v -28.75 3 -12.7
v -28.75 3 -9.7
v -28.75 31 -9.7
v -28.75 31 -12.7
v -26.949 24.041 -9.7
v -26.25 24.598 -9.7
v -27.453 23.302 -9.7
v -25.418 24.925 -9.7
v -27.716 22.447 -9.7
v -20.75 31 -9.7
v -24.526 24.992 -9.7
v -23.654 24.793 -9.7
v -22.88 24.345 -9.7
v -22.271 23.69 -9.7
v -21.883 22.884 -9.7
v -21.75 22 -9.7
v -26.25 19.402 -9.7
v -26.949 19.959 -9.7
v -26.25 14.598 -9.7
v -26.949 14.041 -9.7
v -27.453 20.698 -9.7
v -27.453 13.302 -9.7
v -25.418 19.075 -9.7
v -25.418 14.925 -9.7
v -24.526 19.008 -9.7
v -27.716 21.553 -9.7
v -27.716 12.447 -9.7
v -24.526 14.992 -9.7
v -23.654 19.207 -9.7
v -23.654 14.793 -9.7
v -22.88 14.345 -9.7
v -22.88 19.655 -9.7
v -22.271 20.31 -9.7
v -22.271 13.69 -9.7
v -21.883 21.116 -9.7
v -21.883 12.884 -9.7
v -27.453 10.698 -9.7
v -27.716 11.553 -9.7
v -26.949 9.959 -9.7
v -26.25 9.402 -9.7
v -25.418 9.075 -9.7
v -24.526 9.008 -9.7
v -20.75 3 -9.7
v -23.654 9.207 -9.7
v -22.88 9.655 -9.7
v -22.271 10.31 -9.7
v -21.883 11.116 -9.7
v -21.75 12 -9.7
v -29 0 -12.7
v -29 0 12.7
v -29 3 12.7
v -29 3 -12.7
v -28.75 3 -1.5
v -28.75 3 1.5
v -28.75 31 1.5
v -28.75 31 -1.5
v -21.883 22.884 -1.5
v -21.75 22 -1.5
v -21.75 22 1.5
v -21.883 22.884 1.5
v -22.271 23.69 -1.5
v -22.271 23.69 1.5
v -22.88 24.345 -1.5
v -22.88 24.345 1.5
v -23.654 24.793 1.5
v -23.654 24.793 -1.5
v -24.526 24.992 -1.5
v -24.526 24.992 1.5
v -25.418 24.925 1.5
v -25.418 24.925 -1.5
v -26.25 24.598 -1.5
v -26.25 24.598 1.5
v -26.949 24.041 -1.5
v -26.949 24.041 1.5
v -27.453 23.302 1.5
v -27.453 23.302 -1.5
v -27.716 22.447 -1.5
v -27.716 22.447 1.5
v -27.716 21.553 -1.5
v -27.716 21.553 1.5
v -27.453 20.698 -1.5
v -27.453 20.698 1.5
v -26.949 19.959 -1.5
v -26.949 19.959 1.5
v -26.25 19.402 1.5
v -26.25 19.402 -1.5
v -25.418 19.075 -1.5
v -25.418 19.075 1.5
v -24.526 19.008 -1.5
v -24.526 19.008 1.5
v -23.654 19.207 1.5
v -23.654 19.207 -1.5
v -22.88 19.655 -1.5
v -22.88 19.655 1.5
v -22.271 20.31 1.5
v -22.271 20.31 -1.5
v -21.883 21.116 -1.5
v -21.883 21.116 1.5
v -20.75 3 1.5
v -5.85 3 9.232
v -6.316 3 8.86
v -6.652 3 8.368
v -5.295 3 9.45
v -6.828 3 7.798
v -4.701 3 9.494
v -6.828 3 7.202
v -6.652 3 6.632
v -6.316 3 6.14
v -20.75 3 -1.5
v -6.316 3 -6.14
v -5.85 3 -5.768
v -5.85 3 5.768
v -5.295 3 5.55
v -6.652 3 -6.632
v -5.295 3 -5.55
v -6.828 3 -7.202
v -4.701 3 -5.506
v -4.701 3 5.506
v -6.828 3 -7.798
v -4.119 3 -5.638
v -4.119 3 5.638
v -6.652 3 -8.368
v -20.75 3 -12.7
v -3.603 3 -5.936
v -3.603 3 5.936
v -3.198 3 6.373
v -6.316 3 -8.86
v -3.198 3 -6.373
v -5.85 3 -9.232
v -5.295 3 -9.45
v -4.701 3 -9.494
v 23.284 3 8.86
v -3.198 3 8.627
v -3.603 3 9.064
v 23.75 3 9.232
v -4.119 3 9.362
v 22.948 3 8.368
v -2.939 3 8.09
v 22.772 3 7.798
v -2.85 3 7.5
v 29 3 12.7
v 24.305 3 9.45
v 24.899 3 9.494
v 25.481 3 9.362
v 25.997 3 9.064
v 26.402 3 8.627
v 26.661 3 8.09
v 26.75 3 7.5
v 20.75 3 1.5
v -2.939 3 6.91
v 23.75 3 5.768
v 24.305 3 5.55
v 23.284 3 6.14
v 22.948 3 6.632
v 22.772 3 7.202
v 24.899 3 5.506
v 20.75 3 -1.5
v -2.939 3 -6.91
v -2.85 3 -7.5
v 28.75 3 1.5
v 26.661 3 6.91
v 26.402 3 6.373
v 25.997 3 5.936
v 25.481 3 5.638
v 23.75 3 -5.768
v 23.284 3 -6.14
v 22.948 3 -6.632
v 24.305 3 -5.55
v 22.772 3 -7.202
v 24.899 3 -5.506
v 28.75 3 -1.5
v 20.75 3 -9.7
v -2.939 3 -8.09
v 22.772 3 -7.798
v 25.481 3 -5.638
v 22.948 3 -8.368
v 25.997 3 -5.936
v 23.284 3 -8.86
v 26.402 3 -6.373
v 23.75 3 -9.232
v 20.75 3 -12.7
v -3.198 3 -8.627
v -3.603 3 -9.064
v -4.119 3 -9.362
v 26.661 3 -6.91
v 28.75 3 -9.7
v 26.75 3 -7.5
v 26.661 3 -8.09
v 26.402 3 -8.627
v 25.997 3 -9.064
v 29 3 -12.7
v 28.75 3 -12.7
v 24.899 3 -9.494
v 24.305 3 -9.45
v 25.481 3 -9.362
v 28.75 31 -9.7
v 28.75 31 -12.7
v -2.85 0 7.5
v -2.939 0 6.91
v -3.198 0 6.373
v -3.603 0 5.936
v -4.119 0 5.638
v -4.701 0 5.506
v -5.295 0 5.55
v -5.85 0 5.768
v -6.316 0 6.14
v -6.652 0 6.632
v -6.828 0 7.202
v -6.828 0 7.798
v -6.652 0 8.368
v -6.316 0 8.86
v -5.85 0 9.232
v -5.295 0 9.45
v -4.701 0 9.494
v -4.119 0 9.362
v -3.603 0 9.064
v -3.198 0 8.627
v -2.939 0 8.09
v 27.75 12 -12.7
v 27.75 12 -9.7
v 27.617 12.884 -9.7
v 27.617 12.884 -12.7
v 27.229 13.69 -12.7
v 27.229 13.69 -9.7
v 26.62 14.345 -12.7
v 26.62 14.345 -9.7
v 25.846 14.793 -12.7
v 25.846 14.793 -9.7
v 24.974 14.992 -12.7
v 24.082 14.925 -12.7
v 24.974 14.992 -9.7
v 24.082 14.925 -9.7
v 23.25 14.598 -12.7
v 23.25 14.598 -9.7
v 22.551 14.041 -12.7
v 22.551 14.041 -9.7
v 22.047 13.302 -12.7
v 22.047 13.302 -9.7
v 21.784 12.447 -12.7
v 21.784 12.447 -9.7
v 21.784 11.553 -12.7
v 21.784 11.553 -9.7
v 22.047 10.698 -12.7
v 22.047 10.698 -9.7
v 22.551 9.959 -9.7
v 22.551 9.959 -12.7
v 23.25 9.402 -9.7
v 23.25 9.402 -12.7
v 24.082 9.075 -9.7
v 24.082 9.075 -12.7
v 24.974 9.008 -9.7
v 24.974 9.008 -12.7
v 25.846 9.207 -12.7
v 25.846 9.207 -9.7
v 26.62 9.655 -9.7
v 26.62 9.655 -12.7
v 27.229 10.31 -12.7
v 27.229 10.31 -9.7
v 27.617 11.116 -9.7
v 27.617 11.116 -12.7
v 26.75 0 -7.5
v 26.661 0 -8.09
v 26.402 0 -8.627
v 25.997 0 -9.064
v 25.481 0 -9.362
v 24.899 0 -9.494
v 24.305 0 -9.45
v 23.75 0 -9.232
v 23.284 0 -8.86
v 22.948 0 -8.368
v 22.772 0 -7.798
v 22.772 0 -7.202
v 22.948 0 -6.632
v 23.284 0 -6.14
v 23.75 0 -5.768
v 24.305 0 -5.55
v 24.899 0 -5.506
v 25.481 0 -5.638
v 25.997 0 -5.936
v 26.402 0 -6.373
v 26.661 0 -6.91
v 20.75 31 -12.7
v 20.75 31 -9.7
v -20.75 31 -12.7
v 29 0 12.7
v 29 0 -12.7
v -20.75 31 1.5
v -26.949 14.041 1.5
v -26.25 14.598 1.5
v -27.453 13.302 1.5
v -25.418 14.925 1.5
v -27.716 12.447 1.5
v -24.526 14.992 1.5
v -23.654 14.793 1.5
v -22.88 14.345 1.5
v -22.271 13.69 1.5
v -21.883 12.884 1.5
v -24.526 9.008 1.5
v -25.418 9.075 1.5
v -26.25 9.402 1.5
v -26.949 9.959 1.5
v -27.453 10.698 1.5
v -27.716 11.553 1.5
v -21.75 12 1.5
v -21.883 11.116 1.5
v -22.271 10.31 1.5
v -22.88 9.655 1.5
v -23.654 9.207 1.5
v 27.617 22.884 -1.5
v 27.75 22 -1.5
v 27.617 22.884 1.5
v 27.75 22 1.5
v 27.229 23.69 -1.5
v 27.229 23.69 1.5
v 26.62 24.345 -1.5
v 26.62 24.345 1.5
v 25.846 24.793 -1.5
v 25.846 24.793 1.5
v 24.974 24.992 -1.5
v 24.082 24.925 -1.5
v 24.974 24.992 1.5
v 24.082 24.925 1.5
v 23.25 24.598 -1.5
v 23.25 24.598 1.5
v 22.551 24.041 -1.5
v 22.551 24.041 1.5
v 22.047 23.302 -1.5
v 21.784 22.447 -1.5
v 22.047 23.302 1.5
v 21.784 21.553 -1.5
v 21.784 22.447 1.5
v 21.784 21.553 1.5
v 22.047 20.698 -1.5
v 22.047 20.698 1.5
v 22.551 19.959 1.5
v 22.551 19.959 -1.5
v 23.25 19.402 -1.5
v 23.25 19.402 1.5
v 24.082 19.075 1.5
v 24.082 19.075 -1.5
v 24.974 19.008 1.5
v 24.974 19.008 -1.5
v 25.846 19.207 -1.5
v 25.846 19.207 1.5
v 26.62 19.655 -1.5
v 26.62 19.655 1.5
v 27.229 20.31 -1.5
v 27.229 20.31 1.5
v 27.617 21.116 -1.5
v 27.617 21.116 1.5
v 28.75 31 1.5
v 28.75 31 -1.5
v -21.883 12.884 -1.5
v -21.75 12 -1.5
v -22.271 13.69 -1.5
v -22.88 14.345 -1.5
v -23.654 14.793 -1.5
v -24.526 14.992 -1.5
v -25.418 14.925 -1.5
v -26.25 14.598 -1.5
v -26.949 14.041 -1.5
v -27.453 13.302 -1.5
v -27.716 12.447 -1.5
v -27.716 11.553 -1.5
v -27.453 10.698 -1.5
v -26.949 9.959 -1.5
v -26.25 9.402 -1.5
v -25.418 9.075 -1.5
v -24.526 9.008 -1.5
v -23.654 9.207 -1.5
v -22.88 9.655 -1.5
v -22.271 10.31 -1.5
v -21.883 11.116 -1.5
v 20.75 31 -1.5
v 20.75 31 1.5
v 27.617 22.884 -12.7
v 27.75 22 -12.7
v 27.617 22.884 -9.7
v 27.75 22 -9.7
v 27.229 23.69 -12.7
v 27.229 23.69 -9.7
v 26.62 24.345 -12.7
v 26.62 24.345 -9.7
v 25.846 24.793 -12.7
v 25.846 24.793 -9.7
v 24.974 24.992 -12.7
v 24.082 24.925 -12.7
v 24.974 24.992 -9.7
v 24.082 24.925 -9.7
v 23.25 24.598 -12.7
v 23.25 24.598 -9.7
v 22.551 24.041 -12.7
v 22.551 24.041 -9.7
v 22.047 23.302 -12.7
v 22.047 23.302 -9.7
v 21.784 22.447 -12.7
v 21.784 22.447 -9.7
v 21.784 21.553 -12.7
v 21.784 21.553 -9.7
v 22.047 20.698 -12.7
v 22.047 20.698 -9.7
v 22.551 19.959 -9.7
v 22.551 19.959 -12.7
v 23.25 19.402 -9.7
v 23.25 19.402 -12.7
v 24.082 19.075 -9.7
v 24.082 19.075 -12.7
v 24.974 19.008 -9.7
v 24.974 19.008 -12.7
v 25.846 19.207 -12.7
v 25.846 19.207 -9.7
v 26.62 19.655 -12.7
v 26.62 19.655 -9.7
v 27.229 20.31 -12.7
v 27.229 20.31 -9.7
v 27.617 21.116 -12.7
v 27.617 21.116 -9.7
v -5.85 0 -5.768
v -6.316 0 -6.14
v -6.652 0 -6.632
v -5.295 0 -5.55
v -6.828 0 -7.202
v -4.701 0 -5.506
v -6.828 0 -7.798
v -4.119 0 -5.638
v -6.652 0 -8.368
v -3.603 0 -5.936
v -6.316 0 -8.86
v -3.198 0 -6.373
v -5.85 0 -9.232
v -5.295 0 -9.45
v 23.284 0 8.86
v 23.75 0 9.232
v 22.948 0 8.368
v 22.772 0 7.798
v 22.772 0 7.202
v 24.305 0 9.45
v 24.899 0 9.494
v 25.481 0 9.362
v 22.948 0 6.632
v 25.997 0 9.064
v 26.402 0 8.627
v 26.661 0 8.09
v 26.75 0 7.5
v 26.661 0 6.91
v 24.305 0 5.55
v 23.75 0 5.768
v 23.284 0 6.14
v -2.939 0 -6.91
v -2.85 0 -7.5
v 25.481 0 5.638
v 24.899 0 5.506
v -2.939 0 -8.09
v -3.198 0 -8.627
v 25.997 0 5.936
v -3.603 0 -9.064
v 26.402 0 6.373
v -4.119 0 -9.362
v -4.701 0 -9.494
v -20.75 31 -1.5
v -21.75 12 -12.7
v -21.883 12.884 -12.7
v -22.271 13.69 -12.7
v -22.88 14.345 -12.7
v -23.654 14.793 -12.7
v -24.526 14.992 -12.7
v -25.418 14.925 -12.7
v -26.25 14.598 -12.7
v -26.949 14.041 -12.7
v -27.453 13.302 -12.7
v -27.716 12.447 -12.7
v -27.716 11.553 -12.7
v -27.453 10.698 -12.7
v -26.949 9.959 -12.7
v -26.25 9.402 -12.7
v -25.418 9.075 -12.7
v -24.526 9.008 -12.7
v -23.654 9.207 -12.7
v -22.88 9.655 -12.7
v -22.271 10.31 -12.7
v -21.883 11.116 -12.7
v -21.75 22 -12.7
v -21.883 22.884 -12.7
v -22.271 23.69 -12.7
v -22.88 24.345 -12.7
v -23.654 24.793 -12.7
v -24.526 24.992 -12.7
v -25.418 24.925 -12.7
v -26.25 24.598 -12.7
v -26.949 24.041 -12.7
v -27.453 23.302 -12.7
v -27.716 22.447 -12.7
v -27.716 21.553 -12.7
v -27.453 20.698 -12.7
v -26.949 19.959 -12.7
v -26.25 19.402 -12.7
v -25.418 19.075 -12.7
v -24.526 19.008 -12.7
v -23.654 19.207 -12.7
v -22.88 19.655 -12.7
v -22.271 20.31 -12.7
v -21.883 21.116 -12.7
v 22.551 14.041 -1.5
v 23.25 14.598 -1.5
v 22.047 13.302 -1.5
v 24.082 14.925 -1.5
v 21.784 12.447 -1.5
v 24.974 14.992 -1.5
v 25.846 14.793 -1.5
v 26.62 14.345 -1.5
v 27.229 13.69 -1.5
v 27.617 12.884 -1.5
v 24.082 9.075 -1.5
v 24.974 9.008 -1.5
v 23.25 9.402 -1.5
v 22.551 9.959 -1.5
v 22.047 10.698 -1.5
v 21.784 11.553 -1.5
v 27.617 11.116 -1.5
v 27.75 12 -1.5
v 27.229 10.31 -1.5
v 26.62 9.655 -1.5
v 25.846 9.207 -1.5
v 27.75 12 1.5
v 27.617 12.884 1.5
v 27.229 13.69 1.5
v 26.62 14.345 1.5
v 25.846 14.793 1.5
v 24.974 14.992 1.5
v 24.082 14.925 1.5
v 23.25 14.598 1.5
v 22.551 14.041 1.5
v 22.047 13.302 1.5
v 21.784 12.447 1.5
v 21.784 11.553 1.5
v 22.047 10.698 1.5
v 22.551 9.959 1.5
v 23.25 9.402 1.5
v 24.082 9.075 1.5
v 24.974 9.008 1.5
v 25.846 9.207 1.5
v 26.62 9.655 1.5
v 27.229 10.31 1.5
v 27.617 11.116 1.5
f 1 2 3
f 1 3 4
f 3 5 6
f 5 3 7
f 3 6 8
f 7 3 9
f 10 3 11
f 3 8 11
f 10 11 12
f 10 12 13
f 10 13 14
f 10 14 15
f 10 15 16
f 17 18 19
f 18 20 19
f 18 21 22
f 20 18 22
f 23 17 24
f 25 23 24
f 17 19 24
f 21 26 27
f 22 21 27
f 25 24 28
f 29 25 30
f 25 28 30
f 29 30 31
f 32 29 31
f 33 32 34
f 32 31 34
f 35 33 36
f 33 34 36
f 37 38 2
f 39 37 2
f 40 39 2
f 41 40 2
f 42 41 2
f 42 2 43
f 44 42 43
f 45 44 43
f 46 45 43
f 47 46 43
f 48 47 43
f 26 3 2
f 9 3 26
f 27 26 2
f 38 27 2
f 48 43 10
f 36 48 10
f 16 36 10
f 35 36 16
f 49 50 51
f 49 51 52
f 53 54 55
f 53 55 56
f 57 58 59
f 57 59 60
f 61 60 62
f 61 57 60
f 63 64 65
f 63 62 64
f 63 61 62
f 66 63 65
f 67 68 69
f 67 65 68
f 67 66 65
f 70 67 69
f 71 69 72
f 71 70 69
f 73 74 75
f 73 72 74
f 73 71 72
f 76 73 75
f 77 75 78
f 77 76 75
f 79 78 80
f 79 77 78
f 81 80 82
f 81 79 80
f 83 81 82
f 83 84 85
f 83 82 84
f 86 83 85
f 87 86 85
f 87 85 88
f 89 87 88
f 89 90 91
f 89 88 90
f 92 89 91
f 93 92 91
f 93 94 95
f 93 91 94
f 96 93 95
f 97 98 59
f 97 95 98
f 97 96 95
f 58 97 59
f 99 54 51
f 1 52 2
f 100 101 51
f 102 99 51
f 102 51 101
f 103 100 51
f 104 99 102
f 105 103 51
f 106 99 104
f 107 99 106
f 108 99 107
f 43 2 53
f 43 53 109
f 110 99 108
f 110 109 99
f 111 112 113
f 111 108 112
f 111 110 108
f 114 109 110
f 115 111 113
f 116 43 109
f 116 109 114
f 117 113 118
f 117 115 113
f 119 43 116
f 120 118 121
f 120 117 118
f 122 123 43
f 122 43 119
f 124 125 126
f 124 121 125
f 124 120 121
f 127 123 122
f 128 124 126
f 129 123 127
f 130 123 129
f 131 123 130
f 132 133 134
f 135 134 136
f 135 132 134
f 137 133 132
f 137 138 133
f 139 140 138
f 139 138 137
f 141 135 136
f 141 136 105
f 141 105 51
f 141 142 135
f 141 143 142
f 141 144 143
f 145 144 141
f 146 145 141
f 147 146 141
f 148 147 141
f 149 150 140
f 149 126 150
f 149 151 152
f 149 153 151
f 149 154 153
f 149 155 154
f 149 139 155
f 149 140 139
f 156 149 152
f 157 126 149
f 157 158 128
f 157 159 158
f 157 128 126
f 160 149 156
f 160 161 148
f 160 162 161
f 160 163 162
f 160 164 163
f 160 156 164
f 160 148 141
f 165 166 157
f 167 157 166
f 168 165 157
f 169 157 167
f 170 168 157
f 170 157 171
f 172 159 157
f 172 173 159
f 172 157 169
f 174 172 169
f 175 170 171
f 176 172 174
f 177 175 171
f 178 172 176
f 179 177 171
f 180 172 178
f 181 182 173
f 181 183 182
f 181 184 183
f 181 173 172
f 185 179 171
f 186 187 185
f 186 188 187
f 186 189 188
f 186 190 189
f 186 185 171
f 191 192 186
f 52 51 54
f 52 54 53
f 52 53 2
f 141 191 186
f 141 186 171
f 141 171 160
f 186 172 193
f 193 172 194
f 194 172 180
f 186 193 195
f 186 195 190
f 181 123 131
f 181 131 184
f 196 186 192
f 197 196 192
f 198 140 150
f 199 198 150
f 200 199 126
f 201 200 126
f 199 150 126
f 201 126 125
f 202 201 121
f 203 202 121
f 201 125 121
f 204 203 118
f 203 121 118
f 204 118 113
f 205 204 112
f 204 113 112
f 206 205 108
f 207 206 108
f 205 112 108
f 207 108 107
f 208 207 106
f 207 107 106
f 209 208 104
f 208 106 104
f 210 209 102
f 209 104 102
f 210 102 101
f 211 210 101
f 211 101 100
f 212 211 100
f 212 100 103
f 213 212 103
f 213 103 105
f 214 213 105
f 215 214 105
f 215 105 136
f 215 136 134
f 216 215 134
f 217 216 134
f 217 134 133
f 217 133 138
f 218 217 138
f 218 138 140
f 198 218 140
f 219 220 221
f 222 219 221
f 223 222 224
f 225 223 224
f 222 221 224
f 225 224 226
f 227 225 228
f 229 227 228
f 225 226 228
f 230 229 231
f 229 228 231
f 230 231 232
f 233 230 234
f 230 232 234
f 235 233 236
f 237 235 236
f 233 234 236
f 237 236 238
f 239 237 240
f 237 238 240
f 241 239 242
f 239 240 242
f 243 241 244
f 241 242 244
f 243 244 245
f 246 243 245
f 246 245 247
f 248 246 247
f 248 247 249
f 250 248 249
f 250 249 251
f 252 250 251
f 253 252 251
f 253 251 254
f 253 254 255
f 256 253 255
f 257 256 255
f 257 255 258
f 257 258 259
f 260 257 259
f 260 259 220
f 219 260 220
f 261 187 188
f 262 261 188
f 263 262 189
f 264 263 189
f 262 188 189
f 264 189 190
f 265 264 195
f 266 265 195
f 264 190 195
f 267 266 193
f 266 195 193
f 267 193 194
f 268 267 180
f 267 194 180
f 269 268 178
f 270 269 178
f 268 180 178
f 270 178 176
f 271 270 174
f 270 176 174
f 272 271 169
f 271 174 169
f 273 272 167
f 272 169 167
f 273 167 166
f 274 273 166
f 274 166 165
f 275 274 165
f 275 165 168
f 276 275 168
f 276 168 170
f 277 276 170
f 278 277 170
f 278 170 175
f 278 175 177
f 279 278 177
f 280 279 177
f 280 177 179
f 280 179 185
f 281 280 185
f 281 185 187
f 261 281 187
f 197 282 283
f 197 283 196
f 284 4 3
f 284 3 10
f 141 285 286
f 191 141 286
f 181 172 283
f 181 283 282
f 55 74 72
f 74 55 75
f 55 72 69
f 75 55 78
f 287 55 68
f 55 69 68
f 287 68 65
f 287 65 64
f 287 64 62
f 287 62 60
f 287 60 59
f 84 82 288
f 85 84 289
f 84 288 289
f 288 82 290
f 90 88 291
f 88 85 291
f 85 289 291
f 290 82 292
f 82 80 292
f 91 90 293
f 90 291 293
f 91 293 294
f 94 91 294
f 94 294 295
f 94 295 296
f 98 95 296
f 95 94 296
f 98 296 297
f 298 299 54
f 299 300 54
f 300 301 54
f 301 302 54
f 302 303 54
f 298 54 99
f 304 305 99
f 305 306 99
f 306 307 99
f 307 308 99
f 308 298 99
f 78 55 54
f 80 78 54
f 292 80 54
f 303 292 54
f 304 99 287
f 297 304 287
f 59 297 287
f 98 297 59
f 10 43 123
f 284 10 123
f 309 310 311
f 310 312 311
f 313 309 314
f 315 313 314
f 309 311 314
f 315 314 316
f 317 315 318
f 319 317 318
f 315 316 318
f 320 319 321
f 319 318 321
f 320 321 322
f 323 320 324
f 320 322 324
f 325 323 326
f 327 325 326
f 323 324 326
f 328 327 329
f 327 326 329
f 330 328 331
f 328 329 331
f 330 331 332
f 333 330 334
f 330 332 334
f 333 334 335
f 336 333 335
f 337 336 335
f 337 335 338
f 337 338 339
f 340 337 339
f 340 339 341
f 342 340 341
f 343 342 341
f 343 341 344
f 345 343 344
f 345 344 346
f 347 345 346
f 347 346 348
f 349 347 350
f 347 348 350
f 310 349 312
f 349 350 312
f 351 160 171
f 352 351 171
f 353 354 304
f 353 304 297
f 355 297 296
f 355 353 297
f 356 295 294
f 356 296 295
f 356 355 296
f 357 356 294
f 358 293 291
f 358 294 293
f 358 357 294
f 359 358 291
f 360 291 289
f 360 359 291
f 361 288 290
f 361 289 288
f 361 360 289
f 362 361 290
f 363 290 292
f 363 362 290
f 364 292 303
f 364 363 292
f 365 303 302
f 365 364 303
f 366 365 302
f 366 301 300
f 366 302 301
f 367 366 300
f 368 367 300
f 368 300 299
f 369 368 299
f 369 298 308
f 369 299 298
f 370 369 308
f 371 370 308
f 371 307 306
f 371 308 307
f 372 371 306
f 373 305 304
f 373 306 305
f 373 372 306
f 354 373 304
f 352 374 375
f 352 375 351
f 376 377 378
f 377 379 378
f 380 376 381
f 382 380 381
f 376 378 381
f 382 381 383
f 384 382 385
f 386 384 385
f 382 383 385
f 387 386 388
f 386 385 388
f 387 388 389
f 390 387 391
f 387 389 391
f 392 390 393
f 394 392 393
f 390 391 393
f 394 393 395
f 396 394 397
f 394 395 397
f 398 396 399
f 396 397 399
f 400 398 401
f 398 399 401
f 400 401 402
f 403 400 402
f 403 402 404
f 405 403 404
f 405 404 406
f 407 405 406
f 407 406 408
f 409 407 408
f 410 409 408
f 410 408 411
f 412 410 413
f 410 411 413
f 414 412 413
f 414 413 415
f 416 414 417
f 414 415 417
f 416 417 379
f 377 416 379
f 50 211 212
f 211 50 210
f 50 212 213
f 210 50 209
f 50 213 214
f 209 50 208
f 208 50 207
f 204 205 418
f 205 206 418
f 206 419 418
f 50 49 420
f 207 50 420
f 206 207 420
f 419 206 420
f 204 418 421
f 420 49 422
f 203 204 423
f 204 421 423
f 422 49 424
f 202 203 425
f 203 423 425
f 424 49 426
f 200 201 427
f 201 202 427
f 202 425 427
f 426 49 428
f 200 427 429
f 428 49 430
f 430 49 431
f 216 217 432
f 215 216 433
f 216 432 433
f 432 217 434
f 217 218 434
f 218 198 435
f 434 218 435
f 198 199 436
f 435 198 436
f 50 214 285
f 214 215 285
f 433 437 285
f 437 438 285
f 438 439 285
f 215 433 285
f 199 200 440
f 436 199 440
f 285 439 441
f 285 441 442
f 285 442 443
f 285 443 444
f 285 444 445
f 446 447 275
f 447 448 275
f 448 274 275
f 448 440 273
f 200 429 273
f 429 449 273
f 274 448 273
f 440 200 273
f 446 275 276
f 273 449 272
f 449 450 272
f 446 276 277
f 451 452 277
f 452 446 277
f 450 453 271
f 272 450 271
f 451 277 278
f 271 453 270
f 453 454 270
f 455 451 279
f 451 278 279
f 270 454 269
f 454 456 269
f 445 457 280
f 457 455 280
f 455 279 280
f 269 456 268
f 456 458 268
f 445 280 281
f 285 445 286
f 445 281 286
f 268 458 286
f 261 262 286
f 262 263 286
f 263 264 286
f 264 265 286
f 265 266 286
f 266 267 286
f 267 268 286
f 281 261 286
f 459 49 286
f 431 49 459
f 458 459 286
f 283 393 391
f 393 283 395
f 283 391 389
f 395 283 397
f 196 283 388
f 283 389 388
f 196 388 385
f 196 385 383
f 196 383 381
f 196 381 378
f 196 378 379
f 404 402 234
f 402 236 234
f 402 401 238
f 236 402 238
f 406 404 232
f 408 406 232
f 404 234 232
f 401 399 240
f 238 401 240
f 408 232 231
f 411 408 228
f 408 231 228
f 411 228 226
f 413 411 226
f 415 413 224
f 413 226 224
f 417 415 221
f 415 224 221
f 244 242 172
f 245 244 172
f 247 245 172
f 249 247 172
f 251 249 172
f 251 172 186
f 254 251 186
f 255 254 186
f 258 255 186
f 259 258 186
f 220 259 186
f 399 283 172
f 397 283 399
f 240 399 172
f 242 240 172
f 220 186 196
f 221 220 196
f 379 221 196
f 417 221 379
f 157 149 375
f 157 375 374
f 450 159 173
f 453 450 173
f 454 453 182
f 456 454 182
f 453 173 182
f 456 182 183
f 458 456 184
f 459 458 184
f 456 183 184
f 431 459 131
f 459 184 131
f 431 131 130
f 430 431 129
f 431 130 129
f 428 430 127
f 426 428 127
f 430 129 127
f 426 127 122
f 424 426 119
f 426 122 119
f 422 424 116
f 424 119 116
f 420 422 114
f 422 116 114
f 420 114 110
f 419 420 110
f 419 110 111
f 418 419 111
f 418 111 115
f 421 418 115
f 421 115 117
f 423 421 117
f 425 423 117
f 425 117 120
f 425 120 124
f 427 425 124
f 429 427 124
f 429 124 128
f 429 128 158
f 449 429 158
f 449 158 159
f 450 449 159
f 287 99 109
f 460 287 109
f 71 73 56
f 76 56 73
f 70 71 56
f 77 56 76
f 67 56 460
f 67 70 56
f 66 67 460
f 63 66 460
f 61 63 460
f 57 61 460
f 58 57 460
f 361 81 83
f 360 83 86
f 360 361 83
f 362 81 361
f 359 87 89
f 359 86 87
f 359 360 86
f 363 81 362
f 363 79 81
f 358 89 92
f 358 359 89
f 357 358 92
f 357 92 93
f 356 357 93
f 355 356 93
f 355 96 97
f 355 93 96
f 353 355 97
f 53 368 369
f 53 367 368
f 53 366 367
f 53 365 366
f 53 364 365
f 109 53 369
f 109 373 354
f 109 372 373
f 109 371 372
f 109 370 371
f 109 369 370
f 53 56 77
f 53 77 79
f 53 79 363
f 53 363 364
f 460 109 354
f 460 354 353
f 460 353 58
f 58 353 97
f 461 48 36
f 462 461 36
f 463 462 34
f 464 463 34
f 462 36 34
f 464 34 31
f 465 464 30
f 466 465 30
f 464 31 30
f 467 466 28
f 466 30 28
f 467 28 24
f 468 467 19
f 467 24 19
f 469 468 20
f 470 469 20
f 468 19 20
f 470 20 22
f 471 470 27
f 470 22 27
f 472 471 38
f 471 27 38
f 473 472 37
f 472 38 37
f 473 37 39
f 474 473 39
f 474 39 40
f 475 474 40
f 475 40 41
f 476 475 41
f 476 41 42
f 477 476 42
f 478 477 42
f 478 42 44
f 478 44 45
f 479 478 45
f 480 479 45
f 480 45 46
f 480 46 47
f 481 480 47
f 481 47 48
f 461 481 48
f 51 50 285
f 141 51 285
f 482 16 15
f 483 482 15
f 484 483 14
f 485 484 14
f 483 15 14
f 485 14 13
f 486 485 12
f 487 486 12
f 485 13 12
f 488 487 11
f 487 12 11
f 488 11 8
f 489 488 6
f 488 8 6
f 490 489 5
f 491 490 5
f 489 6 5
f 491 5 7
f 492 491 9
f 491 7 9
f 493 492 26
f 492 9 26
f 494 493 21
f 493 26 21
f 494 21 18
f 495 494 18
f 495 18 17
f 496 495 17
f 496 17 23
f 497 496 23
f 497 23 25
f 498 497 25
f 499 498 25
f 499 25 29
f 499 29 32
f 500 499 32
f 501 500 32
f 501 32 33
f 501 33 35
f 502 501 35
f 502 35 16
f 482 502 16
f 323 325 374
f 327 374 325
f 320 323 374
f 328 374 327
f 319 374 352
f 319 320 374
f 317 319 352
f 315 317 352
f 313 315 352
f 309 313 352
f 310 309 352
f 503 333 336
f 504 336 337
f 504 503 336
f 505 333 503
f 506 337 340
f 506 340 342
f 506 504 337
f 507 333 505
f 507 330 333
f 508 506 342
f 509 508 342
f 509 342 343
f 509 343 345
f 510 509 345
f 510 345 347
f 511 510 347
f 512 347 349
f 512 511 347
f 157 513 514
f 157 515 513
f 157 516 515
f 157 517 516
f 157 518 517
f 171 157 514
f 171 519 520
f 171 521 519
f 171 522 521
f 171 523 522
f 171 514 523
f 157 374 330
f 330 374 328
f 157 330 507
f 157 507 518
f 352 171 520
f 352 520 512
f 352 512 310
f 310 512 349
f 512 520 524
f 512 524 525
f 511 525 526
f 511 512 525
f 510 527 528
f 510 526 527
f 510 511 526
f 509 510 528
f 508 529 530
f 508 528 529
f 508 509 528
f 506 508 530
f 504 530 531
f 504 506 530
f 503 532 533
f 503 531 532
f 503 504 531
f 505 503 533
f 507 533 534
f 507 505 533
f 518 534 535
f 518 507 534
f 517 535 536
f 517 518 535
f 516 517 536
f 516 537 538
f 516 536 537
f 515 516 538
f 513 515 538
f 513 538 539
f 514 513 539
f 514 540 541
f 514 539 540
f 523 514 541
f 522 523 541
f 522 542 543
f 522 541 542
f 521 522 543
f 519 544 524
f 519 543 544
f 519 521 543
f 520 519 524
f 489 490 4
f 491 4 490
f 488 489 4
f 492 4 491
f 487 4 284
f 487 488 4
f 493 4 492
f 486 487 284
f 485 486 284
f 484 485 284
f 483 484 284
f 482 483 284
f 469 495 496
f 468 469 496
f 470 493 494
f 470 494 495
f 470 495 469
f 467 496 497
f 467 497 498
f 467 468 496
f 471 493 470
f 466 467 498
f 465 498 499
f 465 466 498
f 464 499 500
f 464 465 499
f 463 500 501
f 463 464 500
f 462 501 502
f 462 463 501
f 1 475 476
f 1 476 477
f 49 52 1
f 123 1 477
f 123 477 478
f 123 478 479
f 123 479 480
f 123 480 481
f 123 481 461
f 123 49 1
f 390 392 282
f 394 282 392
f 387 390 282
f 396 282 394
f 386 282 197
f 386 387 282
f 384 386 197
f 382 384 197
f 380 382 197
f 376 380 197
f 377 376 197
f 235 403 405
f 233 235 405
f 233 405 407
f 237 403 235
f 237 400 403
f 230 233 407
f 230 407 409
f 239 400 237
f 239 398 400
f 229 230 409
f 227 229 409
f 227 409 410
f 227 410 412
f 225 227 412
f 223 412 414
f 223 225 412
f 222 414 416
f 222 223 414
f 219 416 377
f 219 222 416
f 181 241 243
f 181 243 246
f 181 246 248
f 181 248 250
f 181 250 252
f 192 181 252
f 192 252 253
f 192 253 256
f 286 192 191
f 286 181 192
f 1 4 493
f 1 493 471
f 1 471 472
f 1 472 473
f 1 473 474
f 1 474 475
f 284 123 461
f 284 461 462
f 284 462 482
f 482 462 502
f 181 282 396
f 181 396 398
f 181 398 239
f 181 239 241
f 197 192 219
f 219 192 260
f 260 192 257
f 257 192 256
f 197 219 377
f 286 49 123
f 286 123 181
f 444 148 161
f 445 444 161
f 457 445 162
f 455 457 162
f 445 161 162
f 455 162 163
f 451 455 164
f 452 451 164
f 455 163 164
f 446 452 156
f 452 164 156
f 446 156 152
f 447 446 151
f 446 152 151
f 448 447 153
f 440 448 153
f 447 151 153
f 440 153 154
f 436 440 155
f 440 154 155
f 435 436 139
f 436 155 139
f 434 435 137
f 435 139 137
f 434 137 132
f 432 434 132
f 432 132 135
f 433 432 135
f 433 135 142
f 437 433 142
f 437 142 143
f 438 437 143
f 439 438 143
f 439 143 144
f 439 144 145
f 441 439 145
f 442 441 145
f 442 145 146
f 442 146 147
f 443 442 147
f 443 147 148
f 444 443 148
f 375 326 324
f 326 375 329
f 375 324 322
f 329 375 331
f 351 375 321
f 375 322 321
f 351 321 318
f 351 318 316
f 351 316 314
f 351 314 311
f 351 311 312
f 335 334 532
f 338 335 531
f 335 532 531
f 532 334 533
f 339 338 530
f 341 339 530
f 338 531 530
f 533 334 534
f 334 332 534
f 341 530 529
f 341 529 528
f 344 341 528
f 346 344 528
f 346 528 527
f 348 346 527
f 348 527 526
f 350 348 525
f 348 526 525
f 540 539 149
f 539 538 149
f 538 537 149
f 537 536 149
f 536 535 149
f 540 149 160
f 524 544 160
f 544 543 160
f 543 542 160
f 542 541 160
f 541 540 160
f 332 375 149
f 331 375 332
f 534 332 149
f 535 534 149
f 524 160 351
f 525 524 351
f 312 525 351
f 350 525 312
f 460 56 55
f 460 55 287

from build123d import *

# Parameters (mm, degrees)
SKETCH_1_W          = 58
SKETCH_1_H          = 25.4
EXTRUDE_1_DEPTH     = 3
SKETCH_2_W          = 8
SKETCH_2_H          = 3
EXTRUDE_2_DEPTH     = 28
SKETCH_3_R          = 3
CUT_EXTRUDE_1_DEPTH = 12
SKETCH_4_R          = 2
CUT_EXTRUDE_2_DEPTH = 22


with BuildPart() as part:
    # 草图1 → 凸台-拉伸1 (new body)
    with BuildSketch(Plane(origin=(0, 0, 0), x_dir=(1, 0, 0), z_dir=(0, 1, 0))):
        Rectangle(SKETCH_1_W, SKETCH_1_H)
    extrude(amount=EXTRUDE_1_DEPTH)

    # 草图2 → 凸台-拉伸2 (add)
    with BuildSketch(Plane(origin=(0, 3, 0), x_dir=(1, 0, 0), z_dir=(0, 1, 0))):
        with Locations((-24.75, 11.2)):
            Rectangle(SKETCH_2_W, SKETCH_2_H)
        with Locations((24.75, 11.2)):
            Rectangle(SKETCH_2_W, SKETCH_2_H)
        with Locations((-24.75, 0)):
            Rectangle(SKETCH_2_W, SKETCH_2_H)
        with Locations((24.75, 0)):
            Rectangle(SKETCH_2_W, SKETCH_2_H)
    extrude(amount=EXTRUDE_2_DEPTH)

    # 草图3 → 切除-拉伸1 (cut, symmetric)
    with BuildSketch(Plane.XY.offset(-9.7)):
        with Locations((-24.75, 12)):
            Circle(SKETCH_3_R)
        with Locations((-24.75, 22)):
            Circle(SKETCH_3_R)
        with Locations((24.75, 12)):
            Circle(SKETCH_3_R)
        with Locations((24.75, 22)):
            Circle(SKETCH_3_R)
    extrude(amount=CUT_EXTRUDE_1_DEPTH, both=True, mode=Mode.SUBTRACT)

    # 草图4 → 切除-拉伸2 (cut)
    with BuildSketch(Plane(origin=(0, 3, 0), x_dir=(1, 0, 0), z_dir=(0, 1, 0))):
        with Locations((24.75, -7.5)):
            Circle(SKETCH_4_R)
        with Locations((24.75, 7.5)):
            Circle(SKETCH_4_R)
        with Locations((-4.85, 7.5)):
            Circle(SKETCH_4_R)
        with Locations((-4.85, -7.5)):
            Circle(SKETCH_4_R)
    extrude(amount=-CUT_EXTRUDE_2_DEPTH, mode=Mode.SUBTRACT)


solid = part.part
